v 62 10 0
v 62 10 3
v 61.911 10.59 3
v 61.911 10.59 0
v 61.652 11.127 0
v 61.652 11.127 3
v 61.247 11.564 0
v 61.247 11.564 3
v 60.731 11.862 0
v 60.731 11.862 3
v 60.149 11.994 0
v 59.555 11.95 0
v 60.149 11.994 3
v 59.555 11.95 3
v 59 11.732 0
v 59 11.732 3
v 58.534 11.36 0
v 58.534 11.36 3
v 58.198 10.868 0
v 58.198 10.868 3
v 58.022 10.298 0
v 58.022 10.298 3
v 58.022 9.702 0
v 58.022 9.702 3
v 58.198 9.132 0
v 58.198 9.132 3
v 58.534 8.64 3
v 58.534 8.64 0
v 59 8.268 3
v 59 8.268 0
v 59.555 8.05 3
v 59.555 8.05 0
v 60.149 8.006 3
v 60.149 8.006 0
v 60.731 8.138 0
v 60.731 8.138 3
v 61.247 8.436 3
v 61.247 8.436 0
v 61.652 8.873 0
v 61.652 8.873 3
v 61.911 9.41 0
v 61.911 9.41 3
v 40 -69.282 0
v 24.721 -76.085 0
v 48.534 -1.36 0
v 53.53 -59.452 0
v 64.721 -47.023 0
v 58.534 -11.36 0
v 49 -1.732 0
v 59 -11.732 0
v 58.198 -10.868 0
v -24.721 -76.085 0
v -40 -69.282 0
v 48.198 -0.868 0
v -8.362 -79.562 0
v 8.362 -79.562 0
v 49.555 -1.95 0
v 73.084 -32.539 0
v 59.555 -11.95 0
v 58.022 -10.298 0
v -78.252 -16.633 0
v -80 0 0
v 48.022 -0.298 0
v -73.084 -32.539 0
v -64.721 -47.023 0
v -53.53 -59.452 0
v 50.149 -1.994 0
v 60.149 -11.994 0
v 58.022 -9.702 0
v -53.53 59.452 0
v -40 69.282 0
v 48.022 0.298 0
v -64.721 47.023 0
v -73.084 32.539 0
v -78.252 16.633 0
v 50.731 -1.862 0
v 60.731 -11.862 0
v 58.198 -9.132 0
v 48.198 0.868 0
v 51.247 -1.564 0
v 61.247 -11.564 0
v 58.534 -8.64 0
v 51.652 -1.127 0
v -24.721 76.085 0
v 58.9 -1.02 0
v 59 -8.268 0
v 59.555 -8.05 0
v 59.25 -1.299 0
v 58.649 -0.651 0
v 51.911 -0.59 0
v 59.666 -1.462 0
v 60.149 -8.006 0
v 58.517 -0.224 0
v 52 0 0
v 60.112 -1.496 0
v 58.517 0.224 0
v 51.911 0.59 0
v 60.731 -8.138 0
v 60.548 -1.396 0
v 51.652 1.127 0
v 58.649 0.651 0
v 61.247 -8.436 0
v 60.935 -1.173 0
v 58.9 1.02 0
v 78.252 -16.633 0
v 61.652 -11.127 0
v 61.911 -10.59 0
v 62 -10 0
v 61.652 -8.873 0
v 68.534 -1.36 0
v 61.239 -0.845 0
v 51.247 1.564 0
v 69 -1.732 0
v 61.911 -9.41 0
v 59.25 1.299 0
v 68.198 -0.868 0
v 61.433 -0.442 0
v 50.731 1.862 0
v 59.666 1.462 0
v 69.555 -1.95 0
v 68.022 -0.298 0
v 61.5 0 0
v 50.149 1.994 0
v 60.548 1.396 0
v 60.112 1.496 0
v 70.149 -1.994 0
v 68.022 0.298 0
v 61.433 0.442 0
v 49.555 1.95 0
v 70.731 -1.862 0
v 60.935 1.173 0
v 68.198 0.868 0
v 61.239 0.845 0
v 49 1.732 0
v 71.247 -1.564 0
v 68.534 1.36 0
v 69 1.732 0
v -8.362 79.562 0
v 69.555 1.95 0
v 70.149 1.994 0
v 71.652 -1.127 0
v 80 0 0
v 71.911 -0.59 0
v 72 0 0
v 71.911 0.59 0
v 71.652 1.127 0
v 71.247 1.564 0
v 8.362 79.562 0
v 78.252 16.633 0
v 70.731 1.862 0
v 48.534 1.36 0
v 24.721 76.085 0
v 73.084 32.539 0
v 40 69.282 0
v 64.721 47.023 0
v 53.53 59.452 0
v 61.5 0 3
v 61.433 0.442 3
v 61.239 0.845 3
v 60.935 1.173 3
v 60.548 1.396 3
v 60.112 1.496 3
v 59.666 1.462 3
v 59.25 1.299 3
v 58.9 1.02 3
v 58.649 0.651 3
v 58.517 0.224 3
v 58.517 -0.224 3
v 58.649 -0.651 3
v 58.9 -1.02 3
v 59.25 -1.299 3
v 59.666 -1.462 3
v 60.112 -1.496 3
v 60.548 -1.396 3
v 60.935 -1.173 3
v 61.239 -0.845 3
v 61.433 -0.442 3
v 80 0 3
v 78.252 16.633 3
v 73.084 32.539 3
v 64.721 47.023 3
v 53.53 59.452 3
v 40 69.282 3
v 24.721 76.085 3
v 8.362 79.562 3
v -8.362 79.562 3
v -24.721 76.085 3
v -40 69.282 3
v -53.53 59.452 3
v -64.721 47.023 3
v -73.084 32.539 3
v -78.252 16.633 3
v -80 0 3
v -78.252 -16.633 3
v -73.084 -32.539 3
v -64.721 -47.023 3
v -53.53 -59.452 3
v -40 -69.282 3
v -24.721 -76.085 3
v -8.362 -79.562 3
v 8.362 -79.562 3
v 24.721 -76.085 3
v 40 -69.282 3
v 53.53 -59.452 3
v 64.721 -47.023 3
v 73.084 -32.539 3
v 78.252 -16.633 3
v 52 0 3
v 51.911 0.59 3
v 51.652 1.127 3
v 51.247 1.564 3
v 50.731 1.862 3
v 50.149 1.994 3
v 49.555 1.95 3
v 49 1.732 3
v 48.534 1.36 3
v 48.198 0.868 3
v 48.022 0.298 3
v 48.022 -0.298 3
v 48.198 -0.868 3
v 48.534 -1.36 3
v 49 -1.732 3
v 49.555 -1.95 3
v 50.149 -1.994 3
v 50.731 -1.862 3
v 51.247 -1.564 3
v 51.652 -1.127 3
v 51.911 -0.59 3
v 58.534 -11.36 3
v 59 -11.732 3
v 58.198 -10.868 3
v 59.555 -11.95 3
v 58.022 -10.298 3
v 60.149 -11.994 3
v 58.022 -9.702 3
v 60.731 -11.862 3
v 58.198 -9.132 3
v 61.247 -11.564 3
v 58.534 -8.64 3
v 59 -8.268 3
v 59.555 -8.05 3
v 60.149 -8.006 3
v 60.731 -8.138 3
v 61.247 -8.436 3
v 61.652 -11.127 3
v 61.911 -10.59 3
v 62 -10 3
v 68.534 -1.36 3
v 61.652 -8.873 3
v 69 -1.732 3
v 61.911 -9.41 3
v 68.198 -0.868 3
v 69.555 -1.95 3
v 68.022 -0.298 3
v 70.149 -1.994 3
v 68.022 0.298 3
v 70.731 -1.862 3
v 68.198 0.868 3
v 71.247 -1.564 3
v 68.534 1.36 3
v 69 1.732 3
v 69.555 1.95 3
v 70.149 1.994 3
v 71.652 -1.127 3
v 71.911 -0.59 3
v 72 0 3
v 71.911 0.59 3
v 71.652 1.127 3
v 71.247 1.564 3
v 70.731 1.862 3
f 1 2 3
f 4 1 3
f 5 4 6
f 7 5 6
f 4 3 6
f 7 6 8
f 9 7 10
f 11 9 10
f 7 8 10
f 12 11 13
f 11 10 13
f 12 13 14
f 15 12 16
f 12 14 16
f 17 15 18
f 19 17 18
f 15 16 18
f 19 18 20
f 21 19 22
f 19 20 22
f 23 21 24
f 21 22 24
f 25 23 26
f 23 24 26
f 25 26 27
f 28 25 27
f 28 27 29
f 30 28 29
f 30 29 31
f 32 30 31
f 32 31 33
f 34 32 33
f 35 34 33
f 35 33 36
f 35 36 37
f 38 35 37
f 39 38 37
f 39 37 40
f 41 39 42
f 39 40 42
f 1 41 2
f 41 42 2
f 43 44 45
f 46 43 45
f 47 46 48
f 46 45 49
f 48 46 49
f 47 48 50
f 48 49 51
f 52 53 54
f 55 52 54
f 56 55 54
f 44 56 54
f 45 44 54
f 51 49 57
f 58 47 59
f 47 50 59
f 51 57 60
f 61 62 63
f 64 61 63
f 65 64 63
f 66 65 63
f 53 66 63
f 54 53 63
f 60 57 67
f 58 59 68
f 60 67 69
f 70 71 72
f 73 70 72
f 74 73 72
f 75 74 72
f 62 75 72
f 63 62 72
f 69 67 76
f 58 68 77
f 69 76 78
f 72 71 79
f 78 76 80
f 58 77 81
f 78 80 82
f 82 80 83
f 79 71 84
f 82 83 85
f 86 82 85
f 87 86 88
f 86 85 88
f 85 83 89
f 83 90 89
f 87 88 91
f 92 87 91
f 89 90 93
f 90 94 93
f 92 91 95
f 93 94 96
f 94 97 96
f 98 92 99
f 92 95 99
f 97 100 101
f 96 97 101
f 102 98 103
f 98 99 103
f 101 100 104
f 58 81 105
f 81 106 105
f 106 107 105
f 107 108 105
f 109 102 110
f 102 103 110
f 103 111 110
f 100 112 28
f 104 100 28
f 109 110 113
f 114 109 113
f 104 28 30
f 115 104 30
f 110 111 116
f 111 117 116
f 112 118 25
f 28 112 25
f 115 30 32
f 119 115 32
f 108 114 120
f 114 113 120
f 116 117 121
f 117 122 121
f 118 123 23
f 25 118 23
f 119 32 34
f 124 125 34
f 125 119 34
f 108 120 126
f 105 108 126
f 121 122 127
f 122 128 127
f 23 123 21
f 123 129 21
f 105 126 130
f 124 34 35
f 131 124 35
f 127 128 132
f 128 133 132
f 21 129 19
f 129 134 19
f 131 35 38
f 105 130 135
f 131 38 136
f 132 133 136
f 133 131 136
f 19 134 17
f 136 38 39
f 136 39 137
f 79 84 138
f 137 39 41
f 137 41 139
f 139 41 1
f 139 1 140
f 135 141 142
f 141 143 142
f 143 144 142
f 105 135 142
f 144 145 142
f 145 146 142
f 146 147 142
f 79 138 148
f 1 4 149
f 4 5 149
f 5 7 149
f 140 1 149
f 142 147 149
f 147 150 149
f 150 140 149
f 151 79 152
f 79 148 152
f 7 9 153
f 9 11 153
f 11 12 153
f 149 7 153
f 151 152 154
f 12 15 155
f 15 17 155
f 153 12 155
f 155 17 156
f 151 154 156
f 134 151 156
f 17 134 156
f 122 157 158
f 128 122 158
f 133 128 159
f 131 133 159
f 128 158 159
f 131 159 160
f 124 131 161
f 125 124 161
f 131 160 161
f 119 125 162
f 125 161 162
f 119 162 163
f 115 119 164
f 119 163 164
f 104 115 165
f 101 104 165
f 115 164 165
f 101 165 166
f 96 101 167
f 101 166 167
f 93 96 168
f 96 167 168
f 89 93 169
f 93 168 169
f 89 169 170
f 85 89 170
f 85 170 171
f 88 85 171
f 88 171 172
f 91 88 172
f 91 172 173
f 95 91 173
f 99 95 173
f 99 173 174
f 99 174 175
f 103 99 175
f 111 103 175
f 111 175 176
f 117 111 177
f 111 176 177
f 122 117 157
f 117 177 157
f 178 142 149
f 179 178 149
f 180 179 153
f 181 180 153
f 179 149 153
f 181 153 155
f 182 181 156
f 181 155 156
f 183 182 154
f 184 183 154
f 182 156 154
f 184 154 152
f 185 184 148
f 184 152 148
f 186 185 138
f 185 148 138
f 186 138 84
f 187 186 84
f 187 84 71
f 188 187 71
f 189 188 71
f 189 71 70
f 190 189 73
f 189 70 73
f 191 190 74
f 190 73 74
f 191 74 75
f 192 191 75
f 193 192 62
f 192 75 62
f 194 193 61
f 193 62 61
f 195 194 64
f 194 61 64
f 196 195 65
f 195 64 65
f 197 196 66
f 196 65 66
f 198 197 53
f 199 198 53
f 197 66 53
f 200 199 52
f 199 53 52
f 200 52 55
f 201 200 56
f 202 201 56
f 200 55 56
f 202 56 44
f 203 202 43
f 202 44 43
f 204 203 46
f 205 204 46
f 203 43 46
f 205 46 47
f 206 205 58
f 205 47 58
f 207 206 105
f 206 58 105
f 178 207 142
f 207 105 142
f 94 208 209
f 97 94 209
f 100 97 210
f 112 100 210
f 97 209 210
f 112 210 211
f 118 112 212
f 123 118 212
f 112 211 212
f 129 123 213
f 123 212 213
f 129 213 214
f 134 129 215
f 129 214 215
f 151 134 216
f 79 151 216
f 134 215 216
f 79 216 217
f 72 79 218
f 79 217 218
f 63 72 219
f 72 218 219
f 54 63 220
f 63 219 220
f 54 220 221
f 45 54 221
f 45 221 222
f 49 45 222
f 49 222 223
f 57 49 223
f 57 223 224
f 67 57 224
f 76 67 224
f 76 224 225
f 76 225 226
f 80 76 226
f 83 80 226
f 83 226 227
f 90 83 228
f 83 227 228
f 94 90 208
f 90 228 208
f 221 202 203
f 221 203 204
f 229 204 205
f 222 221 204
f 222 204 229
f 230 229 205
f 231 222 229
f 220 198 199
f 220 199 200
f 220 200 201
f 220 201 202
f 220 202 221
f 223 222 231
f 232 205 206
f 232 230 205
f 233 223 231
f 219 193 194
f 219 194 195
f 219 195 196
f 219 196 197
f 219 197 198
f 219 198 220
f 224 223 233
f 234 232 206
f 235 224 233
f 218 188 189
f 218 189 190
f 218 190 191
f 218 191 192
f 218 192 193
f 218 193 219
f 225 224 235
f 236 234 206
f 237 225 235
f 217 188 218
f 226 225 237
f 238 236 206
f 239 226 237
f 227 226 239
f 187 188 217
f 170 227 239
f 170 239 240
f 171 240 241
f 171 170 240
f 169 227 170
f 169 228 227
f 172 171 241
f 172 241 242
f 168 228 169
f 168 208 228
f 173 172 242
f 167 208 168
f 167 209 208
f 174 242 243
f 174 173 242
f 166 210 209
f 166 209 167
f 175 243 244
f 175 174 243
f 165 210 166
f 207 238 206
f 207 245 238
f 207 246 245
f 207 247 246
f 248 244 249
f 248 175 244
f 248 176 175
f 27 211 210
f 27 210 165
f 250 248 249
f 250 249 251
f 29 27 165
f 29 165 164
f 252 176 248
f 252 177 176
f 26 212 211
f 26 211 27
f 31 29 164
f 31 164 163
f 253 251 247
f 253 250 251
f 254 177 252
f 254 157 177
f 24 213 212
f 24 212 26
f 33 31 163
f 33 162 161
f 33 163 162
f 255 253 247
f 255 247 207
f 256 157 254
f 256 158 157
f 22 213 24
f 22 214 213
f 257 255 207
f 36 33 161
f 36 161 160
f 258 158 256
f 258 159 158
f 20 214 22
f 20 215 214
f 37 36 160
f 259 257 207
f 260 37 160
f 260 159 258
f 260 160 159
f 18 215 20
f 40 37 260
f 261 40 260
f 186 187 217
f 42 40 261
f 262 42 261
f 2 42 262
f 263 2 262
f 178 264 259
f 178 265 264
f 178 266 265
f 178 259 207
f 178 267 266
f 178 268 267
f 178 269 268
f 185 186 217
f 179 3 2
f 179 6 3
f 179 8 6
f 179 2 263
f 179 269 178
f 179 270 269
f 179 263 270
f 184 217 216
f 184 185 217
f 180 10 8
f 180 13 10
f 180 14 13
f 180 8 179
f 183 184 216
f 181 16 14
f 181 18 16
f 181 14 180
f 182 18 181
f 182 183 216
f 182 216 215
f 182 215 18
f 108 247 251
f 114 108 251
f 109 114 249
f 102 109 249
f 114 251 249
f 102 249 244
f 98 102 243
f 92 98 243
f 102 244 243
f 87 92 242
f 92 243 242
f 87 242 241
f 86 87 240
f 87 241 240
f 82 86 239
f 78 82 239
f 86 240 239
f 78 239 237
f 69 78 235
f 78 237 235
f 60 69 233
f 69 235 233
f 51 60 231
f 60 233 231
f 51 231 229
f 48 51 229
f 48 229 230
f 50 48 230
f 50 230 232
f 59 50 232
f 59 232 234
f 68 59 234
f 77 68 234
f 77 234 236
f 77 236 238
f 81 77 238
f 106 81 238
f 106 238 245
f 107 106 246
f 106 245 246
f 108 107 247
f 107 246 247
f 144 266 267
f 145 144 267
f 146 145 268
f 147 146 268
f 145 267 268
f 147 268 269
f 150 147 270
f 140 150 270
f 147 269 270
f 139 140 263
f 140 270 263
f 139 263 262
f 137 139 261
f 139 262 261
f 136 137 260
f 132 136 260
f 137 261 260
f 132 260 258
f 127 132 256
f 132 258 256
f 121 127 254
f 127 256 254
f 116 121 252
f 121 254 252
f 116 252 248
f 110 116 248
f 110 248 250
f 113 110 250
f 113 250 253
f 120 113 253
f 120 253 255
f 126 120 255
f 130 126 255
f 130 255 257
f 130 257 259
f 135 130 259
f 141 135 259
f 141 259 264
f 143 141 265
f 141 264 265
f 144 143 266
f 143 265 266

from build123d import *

# Parameters (mm, degrees)
SKETCH_1_R          = 80
EXTRUDE_1_DEPTH     = 3
SKETCH_2_R          = 2
SKETCH_2_R_2        = 1.5
CUT_EXTRUDE_4_DEPTH = 3


with BuildPart() as part:
    # 草图1 → 凸台-拉伸1 (new body)
    with BuildSketch(Plane.XY):
        Circle(SKETCH_1_R)
    extrude(amount=EXTRUDE_1_DEPTH)

    # 草图2 → 切除-拉伸4 (cut)
    with BuildSketch(Plane.XY.offset(3)):
        with Locations((70, 0)):
            Circle(SKETCH_2_R)
        with Locations((60, -10)):
            Circle(SKETCH_2_R)
        with Locations((60, 0)):
            Circle(SKETCH_2_R_2)
        with Locations((50, 0)):
            Circle(SKETCH_2_R)
        with Locations((60, 10)):
            Circle(SKETCH_2_R)
    extrude(amount=-CUT_EXTRUDE_4_DEPTH, mode=Mode.SUBTRACT)


solid = part.part
